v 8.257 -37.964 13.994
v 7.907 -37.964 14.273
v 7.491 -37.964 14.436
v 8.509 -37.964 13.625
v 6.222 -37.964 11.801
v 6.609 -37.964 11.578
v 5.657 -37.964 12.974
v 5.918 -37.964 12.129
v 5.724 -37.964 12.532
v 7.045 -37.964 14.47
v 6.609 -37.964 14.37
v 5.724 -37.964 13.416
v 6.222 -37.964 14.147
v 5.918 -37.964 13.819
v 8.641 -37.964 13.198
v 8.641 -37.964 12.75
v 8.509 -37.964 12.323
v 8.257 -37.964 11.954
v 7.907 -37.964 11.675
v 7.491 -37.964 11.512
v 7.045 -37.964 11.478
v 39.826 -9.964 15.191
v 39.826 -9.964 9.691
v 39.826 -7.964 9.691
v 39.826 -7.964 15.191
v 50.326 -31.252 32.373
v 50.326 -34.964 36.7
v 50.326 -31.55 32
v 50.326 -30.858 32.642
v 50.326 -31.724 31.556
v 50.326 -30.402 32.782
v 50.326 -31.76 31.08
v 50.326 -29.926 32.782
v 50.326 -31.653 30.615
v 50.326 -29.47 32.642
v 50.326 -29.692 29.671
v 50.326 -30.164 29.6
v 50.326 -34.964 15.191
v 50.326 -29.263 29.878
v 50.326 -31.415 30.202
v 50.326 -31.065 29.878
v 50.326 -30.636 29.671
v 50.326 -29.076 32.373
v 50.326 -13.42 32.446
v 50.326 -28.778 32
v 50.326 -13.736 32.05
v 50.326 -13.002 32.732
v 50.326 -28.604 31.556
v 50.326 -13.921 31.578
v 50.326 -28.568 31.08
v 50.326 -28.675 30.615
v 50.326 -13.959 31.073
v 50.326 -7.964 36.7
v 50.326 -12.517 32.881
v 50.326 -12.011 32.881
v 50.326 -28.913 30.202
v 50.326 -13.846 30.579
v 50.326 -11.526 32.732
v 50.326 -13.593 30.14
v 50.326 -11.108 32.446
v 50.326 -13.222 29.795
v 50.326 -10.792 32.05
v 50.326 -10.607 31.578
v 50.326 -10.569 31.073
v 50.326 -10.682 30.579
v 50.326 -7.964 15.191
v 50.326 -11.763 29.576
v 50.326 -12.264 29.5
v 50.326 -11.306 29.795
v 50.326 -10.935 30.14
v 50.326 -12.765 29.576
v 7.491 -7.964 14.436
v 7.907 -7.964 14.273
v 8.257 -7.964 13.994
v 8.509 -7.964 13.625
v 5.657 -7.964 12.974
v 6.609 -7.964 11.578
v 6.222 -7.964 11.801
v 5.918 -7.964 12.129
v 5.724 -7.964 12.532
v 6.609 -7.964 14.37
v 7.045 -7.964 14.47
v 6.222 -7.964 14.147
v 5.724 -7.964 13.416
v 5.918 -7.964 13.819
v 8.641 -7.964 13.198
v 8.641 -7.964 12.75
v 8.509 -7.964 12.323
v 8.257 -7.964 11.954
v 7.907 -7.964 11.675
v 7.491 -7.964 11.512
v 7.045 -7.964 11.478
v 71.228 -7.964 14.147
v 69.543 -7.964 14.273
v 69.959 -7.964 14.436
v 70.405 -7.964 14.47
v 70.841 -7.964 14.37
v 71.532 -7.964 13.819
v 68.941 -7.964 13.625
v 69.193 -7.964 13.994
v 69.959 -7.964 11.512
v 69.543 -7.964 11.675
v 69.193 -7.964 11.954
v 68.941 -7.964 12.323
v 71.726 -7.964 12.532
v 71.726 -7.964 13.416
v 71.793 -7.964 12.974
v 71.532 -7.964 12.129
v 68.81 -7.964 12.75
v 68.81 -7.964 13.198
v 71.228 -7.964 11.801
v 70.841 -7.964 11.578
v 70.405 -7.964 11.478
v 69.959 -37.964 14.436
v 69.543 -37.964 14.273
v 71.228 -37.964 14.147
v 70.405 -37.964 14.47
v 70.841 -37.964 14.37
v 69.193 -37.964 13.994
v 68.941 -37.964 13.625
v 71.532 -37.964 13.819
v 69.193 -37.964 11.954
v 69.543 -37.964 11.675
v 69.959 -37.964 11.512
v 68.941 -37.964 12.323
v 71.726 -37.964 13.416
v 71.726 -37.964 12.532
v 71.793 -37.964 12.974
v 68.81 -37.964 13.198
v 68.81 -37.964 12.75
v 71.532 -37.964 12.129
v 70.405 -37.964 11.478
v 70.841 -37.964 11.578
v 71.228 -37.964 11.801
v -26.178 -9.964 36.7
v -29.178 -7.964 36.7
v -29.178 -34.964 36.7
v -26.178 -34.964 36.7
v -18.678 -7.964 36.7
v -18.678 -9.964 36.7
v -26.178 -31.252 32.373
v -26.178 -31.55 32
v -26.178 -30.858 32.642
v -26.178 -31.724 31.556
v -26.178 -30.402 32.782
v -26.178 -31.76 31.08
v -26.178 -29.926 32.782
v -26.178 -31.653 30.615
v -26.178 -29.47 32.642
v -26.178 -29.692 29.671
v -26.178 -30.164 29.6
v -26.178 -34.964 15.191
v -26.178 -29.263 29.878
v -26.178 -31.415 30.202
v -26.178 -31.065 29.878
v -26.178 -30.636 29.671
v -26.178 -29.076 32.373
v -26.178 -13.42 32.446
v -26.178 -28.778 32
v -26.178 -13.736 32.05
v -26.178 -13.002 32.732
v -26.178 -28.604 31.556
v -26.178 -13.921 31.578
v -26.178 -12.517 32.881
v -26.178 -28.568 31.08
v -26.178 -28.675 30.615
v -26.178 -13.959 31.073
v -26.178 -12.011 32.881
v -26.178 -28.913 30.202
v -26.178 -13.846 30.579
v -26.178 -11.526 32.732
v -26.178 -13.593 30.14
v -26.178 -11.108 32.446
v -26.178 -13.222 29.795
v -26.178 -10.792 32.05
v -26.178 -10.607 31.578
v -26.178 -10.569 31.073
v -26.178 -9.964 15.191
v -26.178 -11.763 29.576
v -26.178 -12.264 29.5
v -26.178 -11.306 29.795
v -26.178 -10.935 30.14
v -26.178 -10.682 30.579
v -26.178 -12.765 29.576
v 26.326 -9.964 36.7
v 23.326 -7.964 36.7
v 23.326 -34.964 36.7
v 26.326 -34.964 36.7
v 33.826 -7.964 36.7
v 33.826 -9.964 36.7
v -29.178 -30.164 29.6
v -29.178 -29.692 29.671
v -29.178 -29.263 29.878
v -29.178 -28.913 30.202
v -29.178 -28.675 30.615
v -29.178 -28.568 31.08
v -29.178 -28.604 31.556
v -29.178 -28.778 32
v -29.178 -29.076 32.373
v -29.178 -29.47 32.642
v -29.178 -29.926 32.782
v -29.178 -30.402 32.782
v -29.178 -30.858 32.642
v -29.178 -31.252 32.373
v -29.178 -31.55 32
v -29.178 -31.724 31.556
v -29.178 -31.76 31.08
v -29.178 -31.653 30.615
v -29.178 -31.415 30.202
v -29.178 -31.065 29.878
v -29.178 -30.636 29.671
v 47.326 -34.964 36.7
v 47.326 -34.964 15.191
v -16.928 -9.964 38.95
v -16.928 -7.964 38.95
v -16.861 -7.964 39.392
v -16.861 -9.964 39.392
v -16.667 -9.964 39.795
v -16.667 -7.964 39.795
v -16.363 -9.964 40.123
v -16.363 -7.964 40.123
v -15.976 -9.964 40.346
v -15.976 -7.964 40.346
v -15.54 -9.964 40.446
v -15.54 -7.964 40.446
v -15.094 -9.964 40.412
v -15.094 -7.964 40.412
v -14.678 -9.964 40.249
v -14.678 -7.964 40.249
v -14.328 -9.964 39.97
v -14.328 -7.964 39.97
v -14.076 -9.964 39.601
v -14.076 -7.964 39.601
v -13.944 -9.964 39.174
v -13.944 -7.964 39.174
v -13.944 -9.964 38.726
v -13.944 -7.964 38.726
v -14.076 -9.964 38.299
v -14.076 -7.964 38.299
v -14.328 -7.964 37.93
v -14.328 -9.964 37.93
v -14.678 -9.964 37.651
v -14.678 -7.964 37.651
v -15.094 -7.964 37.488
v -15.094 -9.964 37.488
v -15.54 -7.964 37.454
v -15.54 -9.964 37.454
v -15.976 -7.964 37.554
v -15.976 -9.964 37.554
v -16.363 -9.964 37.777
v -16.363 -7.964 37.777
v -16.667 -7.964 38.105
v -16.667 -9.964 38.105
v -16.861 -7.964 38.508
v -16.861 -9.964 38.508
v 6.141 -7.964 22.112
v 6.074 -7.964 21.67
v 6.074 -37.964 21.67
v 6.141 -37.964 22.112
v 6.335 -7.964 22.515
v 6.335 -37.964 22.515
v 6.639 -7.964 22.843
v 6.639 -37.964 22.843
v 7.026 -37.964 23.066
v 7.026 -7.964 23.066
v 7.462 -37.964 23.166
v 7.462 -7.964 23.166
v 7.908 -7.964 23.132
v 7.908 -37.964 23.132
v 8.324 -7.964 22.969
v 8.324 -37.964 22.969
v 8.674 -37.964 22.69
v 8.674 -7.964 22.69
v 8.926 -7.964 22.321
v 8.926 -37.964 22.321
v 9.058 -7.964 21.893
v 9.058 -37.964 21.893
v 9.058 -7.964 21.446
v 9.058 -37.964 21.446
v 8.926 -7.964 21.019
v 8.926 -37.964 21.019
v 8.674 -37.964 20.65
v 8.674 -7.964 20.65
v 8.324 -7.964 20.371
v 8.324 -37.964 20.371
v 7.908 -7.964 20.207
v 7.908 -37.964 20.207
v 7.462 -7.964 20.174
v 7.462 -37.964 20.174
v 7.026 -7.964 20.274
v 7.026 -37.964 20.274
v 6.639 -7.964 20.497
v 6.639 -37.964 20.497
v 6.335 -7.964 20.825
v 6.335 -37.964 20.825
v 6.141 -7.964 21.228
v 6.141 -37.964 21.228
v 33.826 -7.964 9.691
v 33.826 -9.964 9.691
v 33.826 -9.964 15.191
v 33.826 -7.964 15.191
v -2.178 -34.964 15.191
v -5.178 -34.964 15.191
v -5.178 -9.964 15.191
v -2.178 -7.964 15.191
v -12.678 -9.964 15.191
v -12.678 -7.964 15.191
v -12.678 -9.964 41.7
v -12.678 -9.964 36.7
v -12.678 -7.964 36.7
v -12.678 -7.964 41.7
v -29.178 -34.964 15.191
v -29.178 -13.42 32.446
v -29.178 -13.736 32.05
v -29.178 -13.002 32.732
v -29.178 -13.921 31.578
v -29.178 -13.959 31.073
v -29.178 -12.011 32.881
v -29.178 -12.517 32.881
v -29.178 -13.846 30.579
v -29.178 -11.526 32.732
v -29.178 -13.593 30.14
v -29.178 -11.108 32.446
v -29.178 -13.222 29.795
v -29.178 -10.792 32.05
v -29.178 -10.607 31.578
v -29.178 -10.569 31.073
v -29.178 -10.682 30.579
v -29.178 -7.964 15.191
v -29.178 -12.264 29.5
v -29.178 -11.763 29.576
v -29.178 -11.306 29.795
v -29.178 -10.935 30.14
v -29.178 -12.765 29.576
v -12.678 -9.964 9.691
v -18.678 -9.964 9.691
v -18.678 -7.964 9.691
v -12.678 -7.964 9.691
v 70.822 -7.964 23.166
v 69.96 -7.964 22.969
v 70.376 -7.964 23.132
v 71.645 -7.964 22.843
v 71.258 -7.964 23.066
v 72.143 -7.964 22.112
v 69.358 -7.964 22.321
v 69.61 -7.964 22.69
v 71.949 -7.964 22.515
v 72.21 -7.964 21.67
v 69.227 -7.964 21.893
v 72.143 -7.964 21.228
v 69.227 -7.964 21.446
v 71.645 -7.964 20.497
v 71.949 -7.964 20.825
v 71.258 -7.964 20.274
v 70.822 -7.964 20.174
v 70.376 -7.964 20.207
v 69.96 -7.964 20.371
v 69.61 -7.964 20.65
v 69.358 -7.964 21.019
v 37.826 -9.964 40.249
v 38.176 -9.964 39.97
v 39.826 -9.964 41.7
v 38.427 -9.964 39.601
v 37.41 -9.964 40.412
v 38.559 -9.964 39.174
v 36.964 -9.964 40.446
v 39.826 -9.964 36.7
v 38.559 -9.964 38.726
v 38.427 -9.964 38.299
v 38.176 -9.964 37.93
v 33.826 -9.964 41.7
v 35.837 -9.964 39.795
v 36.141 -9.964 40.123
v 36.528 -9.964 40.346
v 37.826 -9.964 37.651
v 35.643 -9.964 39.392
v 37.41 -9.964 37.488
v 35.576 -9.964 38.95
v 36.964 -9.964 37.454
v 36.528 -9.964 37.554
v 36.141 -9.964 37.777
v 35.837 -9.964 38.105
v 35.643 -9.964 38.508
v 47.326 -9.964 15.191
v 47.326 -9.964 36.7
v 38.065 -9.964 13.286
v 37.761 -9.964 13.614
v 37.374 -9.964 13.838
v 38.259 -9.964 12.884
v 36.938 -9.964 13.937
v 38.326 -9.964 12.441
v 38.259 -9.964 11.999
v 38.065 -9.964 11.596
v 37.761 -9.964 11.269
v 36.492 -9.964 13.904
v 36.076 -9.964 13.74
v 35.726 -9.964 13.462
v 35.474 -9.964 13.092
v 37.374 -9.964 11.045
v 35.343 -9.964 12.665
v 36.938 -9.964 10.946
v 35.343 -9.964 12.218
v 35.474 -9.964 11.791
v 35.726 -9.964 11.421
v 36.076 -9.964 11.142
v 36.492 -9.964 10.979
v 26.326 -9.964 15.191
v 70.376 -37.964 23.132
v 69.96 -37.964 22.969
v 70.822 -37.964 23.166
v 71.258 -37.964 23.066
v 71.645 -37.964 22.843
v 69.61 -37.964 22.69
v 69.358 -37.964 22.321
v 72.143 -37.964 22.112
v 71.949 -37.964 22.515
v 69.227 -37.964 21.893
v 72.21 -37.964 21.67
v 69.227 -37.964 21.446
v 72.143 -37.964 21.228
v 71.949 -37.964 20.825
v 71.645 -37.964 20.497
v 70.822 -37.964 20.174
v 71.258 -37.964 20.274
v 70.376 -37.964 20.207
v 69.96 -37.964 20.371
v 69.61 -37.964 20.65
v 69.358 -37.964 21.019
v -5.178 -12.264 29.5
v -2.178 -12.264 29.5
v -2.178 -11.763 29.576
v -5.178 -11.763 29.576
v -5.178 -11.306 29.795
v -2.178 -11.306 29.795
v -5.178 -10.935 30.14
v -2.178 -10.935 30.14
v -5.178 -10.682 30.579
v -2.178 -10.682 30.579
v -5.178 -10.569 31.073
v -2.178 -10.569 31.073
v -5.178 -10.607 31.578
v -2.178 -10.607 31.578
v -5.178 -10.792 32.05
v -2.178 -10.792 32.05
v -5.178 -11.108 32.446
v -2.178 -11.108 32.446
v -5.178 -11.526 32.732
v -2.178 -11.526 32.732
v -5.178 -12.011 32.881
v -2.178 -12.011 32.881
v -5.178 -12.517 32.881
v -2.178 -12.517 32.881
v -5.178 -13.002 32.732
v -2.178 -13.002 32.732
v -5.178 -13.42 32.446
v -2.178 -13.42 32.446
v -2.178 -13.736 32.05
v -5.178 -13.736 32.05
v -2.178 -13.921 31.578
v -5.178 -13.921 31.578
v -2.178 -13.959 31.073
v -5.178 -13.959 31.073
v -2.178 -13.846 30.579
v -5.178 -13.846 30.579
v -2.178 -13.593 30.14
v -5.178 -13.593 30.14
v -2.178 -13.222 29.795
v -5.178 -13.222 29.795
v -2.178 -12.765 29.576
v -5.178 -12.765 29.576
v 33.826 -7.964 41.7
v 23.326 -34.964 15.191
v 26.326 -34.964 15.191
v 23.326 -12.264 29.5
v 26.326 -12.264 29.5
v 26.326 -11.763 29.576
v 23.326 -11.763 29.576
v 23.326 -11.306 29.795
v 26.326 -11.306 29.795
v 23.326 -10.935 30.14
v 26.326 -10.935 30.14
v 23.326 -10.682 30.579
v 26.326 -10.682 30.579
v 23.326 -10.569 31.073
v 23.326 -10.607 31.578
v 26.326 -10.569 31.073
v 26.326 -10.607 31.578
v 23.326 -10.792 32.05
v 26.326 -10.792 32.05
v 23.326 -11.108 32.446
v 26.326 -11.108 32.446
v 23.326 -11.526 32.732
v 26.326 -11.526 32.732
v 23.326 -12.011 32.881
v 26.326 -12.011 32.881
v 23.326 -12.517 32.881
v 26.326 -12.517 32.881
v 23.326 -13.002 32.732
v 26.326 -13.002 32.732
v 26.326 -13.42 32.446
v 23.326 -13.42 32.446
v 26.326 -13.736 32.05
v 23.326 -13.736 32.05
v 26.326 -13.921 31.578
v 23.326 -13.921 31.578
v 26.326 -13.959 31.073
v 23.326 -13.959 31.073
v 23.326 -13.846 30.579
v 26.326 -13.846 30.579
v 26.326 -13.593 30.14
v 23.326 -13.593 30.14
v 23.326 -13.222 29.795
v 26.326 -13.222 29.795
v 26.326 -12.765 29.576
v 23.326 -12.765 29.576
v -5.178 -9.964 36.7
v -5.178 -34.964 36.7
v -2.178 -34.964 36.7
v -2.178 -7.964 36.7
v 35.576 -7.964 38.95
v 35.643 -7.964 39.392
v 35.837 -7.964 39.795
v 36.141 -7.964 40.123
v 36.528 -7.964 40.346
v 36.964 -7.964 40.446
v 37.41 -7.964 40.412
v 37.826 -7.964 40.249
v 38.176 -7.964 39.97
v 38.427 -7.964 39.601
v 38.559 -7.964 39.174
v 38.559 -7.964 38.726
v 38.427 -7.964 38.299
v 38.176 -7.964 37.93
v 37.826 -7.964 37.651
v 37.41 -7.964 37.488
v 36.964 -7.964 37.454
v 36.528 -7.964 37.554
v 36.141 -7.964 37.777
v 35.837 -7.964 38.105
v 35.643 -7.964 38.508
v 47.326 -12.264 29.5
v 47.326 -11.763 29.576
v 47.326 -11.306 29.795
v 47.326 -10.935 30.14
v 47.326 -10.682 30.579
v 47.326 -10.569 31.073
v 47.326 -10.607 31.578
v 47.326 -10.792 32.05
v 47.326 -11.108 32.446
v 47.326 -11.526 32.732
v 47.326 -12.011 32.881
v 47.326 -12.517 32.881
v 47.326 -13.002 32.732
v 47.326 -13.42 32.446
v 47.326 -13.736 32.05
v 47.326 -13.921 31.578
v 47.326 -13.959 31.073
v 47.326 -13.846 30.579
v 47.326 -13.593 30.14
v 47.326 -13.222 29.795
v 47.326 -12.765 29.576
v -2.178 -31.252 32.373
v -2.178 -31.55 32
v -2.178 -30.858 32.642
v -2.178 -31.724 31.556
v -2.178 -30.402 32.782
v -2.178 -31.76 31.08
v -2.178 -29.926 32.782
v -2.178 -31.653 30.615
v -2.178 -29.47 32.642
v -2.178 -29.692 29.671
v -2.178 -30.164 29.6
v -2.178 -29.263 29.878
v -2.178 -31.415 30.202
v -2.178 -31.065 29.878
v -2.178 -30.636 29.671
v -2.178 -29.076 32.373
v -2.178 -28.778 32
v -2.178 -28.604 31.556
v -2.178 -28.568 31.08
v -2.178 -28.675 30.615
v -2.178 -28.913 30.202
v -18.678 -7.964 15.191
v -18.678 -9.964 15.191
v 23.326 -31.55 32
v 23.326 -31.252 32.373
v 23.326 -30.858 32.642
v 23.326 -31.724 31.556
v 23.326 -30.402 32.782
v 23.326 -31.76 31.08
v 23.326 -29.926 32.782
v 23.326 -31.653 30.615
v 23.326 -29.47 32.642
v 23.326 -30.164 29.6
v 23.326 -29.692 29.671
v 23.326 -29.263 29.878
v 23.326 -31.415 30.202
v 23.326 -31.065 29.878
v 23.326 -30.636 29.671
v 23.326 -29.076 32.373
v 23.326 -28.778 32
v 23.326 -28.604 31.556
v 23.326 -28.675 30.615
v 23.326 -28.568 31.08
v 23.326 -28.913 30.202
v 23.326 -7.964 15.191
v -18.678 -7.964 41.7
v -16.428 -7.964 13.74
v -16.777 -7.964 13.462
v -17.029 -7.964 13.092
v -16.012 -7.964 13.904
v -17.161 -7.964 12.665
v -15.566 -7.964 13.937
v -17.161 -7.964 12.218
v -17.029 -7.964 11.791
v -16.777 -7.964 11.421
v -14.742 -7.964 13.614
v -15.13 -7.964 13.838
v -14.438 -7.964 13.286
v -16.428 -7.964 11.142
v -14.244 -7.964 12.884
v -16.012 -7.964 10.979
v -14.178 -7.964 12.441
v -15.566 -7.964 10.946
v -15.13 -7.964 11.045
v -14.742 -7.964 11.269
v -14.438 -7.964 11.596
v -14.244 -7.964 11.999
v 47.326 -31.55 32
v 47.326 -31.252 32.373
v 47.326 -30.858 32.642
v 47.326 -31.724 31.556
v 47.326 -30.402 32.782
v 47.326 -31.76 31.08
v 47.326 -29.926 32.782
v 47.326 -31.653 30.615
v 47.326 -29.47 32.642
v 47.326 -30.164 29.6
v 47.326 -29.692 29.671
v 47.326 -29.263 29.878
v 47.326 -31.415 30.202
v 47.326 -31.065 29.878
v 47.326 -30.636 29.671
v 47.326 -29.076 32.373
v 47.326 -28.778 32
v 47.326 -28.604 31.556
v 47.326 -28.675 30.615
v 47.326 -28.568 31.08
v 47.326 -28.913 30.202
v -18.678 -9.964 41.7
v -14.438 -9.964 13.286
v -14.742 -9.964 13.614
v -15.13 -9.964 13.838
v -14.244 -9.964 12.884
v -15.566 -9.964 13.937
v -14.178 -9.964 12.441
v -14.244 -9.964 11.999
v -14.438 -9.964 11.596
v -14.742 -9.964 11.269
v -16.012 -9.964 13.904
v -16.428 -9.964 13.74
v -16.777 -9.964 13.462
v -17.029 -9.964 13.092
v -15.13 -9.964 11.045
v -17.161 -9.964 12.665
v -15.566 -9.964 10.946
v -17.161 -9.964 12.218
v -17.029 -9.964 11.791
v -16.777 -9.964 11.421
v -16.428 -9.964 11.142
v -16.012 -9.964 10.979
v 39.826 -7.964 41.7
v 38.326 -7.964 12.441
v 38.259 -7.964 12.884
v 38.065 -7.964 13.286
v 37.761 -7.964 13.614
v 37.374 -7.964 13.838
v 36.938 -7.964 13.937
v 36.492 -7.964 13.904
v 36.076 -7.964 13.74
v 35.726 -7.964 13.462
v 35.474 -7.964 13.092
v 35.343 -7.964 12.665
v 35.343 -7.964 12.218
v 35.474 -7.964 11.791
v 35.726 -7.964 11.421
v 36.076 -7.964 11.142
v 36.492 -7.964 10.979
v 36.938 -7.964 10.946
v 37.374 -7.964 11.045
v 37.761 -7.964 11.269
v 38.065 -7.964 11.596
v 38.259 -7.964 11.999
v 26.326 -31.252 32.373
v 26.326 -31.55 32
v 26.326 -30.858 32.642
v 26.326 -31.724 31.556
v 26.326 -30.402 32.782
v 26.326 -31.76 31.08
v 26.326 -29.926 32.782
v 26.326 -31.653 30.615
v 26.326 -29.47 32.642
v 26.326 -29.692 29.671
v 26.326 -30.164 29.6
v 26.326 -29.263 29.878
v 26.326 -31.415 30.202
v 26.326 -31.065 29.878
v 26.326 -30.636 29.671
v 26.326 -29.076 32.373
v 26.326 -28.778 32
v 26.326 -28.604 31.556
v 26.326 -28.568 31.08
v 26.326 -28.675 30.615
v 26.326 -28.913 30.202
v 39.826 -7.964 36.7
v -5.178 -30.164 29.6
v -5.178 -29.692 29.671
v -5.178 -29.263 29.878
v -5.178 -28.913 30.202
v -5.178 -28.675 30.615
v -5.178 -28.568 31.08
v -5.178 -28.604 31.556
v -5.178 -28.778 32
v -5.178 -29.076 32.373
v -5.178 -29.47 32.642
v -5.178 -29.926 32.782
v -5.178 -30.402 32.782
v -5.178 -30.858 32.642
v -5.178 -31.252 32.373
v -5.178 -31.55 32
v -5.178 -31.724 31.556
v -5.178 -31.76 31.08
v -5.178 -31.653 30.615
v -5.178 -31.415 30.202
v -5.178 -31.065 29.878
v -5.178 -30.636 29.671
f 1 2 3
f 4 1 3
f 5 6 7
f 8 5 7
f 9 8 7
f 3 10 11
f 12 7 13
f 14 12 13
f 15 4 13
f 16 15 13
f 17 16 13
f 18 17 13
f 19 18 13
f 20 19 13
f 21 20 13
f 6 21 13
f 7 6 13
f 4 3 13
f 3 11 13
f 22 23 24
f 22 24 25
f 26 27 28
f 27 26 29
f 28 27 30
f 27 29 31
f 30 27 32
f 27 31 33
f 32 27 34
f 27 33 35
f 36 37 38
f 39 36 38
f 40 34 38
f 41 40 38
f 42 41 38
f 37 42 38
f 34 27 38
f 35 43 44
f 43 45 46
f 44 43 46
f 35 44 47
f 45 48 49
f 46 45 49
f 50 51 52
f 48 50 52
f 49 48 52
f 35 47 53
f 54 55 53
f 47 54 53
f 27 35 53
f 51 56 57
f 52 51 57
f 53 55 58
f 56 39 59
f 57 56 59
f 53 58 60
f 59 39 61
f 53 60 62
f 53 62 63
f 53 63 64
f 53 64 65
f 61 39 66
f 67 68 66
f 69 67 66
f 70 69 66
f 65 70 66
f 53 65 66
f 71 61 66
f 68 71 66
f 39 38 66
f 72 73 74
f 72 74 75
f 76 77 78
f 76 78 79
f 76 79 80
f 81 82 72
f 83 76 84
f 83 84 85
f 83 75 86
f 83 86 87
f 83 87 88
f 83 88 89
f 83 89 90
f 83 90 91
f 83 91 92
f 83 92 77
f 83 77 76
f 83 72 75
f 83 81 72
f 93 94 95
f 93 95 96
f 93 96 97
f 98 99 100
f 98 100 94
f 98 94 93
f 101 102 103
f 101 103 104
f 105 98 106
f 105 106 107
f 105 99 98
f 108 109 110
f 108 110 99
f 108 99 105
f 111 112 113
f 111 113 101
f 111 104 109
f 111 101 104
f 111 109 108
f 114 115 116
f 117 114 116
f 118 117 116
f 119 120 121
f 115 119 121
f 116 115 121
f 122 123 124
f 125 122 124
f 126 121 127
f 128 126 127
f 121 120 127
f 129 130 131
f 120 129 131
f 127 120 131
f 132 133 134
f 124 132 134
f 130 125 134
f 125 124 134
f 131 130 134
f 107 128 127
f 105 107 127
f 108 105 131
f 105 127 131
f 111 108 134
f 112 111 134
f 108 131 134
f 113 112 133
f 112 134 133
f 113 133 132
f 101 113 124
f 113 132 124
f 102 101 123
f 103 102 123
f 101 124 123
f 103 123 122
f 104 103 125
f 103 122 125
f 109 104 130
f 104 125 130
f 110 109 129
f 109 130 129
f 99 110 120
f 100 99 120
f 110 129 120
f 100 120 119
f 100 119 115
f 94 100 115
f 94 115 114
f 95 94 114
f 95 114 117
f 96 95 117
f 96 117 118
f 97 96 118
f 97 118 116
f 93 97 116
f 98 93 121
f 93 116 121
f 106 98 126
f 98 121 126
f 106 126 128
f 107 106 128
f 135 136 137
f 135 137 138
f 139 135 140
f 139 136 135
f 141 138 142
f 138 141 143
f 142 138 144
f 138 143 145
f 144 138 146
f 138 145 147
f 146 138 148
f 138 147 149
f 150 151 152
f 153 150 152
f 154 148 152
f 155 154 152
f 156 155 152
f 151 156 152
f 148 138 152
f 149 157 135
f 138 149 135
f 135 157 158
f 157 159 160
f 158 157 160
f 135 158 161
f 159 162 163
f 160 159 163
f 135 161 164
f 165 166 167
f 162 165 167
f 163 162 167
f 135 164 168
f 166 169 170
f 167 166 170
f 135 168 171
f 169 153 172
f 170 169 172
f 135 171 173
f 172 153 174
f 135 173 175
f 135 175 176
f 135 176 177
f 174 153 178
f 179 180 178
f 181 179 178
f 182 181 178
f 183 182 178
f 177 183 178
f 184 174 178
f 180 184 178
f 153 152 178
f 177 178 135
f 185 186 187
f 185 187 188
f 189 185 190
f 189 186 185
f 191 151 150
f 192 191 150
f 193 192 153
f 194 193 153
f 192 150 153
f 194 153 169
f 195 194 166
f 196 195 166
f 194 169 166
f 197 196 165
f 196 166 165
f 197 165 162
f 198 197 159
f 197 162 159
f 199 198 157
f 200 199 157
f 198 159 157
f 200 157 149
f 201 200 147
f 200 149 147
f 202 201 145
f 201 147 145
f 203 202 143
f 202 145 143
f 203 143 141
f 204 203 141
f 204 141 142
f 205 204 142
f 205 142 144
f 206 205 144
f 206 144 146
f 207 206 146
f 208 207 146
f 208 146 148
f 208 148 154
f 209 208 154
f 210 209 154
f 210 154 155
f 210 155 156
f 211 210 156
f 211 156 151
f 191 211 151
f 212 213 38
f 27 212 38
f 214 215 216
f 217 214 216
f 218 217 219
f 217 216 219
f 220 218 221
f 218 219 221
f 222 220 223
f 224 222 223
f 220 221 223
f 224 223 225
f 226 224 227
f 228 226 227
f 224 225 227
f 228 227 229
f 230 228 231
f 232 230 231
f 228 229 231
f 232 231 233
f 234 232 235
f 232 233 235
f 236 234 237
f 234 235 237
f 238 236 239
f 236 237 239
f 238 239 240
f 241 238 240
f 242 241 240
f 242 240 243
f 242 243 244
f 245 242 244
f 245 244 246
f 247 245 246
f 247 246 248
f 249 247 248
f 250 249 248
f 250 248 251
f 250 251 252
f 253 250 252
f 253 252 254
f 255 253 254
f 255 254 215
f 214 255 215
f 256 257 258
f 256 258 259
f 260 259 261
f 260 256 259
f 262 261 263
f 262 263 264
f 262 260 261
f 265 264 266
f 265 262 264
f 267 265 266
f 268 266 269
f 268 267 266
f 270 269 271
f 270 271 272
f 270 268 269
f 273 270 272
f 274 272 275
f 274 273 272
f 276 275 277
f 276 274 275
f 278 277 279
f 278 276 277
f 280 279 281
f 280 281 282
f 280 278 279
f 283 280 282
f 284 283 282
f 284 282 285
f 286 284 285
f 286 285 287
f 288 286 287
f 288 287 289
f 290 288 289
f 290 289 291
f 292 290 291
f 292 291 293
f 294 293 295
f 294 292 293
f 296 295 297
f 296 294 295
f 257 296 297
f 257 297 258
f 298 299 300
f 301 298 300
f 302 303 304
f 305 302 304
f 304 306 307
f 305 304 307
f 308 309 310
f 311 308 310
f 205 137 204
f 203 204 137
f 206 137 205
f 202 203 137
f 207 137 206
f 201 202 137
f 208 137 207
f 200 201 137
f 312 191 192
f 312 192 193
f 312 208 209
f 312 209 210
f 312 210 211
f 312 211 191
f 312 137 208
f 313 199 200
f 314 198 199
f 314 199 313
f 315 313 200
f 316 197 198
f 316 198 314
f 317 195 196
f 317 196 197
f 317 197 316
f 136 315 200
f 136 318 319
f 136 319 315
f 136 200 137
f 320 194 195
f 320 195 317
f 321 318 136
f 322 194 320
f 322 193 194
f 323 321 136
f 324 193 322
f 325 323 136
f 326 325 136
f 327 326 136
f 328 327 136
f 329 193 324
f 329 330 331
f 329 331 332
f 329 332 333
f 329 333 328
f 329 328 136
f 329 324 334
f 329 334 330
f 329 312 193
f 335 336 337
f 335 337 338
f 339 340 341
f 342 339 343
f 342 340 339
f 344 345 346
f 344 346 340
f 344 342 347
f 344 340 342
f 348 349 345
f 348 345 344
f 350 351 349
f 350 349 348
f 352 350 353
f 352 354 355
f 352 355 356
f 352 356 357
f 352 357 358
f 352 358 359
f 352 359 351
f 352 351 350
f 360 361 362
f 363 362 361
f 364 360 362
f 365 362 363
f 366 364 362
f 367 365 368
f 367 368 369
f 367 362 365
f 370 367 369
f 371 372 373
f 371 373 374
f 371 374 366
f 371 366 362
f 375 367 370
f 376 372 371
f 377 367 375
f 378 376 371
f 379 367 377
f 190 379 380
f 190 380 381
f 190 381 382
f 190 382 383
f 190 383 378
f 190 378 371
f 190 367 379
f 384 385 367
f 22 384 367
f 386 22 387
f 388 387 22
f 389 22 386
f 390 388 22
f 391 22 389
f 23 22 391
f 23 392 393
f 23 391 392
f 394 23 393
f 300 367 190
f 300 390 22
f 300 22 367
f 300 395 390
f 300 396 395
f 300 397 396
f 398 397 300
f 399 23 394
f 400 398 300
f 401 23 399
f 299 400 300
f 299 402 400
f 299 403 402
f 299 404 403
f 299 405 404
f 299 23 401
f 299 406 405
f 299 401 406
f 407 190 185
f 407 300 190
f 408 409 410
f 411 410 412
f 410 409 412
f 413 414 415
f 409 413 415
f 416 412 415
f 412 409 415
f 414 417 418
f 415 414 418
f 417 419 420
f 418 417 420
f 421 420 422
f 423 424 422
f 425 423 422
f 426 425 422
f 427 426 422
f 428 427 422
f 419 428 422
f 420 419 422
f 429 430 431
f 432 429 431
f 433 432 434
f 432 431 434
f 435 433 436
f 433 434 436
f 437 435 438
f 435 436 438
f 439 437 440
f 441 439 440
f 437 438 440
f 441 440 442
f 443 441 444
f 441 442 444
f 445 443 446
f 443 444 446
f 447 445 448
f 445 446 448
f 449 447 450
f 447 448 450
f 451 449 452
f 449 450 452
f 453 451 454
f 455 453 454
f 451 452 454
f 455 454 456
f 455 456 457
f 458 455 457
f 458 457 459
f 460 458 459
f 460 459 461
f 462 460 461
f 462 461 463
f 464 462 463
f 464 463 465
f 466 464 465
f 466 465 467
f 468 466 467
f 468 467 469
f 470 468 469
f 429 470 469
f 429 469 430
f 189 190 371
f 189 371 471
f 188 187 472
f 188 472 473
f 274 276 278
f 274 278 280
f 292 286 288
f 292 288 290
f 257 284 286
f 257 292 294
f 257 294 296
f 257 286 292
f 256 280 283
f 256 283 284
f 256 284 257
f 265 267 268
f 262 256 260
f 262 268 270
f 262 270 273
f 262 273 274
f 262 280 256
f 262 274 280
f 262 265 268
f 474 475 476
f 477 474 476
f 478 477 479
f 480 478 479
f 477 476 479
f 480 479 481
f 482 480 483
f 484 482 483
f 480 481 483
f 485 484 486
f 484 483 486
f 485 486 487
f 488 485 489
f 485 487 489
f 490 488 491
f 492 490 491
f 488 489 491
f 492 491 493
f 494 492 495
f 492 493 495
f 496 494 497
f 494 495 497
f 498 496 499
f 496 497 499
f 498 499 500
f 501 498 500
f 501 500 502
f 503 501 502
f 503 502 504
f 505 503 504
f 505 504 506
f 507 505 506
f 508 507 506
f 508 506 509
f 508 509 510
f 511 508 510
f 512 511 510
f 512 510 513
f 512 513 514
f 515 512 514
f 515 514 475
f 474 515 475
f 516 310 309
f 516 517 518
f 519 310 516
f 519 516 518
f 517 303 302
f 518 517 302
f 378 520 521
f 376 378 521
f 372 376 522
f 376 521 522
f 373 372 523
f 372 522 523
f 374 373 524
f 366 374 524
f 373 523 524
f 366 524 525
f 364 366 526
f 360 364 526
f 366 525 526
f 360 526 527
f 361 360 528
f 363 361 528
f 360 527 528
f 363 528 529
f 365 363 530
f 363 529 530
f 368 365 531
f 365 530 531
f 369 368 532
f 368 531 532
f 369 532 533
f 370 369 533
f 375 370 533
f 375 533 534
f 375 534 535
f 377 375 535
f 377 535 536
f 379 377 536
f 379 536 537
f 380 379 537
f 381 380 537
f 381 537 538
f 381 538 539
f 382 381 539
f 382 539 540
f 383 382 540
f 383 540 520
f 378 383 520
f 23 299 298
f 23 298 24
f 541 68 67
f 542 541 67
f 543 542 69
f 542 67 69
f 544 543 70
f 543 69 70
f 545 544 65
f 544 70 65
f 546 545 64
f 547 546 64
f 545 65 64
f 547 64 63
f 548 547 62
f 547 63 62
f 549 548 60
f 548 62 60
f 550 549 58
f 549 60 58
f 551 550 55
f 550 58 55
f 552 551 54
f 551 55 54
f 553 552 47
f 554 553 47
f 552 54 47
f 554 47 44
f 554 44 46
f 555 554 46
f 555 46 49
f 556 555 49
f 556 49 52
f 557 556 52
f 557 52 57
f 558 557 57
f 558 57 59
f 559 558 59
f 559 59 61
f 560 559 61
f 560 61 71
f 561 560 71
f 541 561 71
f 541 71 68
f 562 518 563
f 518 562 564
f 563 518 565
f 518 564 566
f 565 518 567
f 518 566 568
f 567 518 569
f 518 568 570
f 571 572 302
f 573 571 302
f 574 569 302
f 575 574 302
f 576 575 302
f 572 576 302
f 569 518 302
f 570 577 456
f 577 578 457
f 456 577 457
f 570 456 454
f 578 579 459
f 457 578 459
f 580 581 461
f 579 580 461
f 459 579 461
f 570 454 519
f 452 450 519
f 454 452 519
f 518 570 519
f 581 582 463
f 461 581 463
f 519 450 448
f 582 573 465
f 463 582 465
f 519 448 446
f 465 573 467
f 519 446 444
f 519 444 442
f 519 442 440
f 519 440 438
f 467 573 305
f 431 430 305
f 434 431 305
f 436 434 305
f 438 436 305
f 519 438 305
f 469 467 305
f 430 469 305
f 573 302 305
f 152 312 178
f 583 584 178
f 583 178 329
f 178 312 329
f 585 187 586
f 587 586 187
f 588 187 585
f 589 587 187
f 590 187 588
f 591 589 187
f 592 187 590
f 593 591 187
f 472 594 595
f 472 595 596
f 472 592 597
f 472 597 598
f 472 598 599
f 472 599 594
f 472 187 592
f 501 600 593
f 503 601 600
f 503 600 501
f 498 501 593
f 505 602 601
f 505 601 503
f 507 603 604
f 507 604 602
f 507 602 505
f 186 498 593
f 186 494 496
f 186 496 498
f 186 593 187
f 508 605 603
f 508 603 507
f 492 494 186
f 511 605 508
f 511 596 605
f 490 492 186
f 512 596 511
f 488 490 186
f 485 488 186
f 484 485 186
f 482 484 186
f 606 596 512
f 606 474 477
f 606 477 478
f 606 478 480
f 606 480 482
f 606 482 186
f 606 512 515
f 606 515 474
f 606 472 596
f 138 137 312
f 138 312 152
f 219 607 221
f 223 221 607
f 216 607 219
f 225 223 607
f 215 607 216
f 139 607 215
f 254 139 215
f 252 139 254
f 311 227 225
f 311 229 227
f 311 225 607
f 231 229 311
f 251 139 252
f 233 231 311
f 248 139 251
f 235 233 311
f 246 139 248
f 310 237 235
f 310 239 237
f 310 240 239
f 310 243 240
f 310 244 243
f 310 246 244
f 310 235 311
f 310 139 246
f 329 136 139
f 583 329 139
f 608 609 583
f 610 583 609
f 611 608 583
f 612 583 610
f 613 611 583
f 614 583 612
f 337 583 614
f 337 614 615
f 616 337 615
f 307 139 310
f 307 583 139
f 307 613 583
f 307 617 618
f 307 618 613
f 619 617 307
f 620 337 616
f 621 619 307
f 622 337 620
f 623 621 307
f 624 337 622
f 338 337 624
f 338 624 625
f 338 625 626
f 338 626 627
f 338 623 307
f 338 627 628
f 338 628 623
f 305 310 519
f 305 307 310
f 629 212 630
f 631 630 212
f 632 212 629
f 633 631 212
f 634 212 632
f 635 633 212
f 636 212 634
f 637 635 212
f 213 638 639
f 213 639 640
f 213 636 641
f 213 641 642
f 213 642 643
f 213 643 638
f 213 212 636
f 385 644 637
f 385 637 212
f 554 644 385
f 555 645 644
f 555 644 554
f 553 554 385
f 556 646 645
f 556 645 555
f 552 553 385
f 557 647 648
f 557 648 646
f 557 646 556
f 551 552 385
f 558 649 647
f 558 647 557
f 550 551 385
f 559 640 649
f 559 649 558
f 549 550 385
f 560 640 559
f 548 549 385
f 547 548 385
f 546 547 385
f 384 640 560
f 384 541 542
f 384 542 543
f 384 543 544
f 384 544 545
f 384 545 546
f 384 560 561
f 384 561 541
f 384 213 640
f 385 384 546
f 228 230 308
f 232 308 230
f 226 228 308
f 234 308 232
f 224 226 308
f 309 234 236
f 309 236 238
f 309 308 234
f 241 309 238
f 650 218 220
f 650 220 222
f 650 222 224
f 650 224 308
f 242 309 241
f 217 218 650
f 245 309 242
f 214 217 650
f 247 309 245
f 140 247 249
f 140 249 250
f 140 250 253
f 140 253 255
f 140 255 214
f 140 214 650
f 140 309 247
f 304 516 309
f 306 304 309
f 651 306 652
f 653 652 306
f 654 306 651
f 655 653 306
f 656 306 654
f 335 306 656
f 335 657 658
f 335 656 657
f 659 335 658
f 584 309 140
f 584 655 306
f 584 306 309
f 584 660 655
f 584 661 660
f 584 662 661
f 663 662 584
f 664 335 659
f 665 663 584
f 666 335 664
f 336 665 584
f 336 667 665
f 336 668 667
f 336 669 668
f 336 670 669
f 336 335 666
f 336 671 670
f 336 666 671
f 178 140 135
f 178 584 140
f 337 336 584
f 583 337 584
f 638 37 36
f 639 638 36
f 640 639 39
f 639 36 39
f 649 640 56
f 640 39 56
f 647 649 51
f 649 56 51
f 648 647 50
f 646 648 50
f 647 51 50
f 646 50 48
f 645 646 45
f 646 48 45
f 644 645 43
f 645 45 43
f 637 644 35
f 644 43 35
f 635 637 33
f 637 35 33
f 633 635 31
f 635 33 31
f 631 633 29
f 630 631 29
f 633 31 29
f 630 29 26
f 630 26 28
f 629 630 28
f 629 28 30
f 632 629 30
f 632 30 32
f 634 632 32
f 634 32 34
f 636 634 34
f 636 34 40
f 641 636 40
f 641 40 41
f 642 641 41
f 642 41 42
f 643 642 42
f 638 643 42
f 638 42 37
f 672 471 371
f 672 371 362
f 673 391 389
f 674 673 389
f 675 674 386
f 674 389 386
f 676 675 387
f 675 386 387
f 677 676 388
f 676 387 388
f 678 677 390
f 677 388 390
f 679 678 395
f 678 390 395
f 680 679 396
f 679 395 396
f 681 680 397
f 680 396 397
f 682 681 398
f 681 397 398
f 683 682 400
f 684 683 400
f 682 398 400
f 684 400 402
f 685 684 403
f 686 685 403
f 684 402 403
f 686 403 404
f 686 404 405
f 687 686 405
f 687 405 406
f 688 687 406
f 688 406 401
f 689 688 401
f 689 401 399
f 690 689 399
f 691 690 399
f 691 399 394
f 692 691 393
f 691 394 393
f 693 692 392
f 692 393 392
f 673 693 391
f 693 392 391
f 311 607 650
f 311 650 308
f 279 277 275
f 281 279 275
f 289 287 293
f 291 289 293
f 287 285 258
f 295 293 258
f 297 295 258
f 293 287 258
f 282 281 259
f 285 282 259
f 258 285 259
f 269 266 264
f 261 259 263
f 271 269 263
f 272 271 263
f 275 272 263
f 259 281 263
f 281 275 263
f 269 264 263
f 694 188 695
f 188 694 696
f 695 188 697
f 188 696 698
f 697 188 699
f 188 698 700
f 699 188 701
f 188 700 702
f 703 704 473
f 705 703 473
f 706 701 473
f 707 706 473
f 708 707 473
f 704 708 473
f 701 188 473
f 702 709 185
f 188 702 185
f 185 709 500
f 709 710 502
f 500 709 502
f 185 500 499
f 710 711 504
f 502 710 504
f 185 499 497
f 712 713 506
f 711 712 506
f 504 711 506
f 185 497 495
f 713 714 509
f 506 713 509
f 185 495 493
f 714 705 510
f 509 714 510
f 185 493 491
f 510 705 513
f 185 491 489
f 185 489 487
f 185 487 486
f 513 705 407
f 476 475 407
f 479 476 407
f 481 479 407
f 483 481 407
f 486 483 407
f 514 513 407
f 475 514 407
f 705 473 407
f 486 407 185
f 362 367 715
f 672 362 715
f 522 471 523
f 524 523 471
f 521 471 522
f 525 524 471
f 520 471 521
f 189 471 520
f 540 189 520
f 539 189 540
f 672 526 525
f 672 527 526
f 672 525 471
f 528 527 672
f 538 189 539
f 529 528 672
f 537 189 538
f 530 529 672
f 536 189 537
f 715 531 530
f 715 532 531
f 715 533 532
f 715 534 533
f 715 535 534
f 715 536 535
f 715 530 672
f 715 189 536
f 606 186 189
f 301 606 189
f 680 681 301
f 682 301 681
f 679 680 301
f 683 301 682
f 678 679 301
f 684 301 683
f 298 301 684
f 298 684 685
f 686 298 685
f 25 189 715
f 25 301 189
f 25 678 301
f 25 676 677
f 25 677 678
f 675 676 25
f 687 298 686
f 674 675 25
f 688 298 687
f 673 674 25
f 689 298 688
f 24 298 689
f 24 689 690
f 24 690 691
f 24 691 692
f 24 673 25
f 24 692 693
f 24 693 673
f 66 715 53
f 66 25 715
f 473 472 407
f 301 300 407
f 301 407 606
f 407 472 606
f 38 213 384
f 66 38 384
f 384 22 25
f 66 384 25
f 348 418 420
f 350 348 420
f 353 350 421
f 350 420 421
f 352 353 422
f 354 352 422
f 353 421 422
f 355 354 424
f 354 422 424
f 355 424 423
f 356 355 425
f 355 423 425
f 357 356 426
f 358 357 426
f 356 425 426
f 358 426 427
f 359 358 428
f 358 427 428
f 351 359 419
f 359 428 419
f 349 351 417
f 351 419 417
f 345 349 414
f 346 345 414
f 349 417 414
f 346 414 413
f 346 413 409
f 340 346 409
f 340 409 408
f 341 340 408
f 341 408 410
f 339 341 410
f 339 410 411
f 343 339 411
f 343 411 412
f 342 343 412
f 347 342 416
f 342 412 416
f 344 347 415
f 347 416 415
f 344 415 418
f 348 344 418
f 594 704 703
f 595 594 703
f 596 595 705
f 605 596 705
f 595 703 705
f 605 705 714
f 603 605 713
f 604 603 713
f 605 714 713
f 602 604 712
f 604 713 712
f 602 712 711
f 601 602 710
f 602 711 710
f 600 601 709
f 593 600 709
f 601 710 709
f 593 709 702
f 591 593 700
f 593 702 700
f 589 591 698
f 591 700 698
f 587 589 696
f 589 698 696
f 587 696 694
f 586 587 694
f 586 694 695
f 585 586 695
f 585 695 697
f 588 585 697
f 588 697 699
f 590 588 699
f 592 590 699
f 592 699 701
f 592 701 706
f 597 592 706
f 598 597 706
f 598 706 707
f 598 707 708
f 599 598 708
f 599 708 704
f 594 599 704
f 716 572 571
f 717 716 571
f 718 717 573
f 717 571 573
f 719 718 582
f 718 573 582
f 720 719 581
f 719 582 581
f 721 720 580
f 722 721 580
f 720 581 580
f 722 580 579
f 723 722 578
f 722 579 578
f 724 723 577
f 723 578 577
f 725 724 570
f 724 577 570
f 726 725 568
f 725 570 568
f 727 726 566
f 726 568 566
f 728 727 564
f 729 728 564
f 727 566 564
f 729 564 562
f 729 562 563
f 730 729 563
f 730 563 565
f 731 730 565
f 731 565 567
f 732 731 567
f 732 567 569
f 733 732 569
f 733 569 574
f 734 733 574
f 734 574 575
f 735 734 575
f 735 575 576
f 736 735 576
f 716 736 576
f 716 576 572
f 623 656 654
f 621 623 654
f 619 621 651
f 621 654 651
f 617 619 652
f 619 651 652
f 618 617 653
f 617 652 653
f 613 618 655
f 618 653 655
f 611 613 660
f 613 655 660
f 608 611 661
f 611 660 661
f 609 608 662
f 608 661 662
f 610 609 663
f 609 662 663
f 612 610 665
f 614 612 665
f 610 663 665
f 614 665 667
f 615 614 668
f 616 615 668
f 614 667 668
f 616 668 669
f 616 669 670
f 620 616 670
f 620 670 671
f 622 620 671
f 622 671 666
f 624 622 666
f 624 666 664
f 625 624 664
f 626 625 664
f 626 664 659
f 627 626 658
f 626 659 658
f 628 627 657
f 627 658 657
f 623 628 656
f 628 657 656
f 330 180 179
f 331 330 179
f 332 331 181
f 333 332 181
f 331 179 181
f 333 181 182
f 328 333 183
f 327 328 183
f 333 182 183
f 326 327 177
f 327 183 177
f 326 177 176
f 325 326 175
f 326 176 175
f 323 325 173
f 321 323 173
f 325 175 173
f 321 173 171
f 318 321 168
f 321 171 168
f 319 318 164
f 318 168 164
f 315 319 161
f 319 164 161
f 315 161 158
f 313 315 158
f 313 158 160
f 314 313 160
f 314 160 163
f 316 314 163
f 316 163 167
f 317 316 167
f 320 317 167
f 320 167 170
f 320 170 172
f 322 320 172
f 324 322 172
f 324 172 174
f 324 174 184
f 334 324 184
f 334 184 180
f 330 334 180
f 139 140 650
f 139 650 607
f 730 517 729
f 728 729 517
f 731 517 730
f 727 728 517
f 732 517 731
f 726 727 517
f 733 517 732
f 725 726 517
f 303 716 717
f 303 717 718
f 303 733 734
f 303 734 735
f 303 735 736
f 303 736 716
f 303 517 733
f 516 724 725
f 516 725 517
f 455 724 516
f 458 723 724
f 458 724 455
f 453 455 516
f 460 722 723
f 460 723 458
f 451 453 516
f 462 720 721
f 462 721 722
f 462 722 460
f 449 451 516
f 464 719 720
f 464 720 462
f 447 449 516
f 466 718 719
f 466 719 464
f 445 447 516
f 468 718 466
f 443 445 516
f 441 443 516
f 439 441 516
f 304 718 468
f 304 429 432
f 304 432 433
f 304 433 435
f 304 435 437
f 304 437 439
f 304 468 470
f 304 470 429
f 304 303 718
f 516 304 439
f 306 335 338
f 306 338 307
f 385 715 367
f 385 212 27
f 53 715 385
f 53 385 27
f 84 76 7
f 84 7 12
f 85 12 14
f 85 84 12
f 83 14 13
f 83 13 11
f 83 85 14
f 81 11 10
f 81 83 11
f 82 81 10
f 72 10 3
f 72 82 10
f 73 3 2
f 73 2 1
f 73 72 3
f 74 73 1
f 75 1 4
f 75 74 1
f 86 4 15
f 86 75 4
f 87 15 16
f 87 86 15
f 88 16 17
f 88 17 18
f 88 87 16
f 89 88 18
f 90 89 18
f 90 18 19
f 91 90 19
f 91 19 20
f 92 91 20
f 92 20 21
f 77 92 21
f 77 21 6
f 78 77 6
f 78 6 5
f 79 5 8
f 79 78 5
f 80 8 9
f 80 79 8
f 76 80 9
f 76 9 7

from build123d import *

# Parameters (mm, degrees)
SKETCH1_W                 = 27
SKETCH1_H                 = 27
BOSS_EXTRUDE1_DEPTH       = 36.7
SKETCH2_W                 = 21
SKETCH2_H                 = 25
CUT_EXTRUDE1_DEPTH        = 36.7
SKETCH3_R                 = 1.7
SKETCH3_R_2               = 1.6
CUT_EXTRUDE2_DEPTH        = 36.7
SKETCH4_R                 = 3
CUT_EXTRUDE3_DEPTH        = 36.7
SKETCH8_R                 = 1.5
BOSS_EXTRUDE3_DEPTH       = 30
BOSS_EXTRUDE3_2_DEPTH     = 30
SKETCH9_W                 = 5.918746276
SKETCH9_H                 = 6
SKETCH9_W_2               = 6.707912446
CUT_EXTRUDE4_DEPTH        = 12
SKETCH11_W                = 15.191448775
SKETCH11_H                = 37.067540439
CUT_EXTRUDE6_DEPTH        = 32
SKETCH15_W                = 6
SKETCH15_H                = 12.008551225
SKETCH15_R                = 1.5
BOSS_EXTRUDE5_DEPTH       = 2.5
SKETCH17_W                = 99.088440485
SKETCH17_H                = 65.829588933
CUT_EXTRUDE9_DEPTH        = 50
SKETCH18_W                = 6
SKETCH18_H                = 2
BOSS_EXTRUDE6_DEPTH       = 5
SKETCH19_R                = 1.5
CUT_EXTRUDE10_DEPTH       = 5
SKETCH20_W                = 6
SKETCH20_H                = 5.5
SKETCH20_R                = 1.5
BOSS_EXTRUDE7_DEPTH       = 2
BODY_MOVE_COPY8_START     = -37.96401366
BODY_MOVE_COPY8_OUTLINE_R = 1.5
BODY_MOVE_COPY8_DEPTH     = 30


# Read off the part's stored shape, not the designer's step: Body-Move/Copy8
with BuildPart() as part:
    # Sketch1 → Boss-Extrude1 (new body)
    with BuildSketch(Plane.XY):
        with Locations((-15.677732696, -21.46401366)):
            Rectangle(SKETCH1_W, SKETCH1_H)
    extrude(amount=BOSS_EXTRUDE1_DEPTH)

    # Sketch2 → Cut-Extrude1 (cut)
    with BuildSketch(Plane(origin=(0, 0, 0), x_dir=(-1, 0, 0), z_dir=(0, 0, -1))):
        with Locations((15.677732696, -22.46401366)):
            Rectangle(SKETCH2_W, SKETCH2_H)
    extrude(amount=-CUT_EXTRUDE1_DEPTH, mode=Mode.SUBTRACT)

    # Sketch3 → Cut-Extrude2 (cut)
    with BuildSketch(Plane(origin=(-2.177732696, 0, 0), x_dir=(0, 0, -1), z_dir=(1, 0, 0))):
        with Locations((-31.2, -12.26401366)):
            Circle(SKETCH3_R)
        with Locations((-31.2, -30.16401366)):
            Circle(SKETCH3_R_2)
    extrude(amount=-CUT_EXTRUDE2_DEPTH, mode=Mode.SUBTRACT)

    # Sketch4 → Cut-Extrude3 (cut)
    with BuildSketch(Plane(origin=(-2.177732696, 0, 0), x_dir=(0, 0, -1), z_dir=(1, 0, 0))):
        with Locations((-12.025092395, -21.16401366)):
            Circle(SKETCH4_R)
    extrude(amount=-CUT_EXTRUDE3_DEPTH, mode=Mode.SUBTRACT)

    # Sketch9 → Cut-Extrude4 (cut)
    with BuildSketch(Plane(origin=(0, 0, 0), x_dir=(-1, 0, 0), z_dir=(0, 0, -1))):
        with Locations((3.689038825, -21.16401366)):
            Rectangle(SKETCH9_W, SKETCH9_H)
        with Locations((28.103867214, -21.16401366)):
            Rectangle(SKETCH9_W_2, SKETCH9_H)
    extrude(amount=-CUT_EXTRUDE4_DEPTH, mode=Mode.SUBTRACT)

    # Sketch11 → Cut-Extrude6 (cut)
    with BuildSketch(Plane.ZY.offset(29.177732696)):
        with Locations((7.595724388, -16.43024344)):
            Rectangle(SKETCH11_W, SKETCH11_H)
    extrude(amount=-CUT_EXTRUDE6_DEPTH, mode=Mode.SUBTRACT)


with BuildPart() as body_2:
    # Sketch8 → Boss-Extrude3 (new body)
    with BuildSketch(Plane(origin=(0, -7.96401366, 0), x_dir=(1, 0, 0), z_dir=(0, 1, 0))):
        with Locations(Location((7.15742756, -12.973989901, 0), (0, 0, 180))):
            Circle(SKETCH8_R)
    extrude(amount=-BOSS_EXTRUDE3_DEPTH)


with BuildPart() as body_3:
    # Sketch8 → Boss-Extrude3 2 (new body)
    with BuildSketch(Plane(origin=(0, -7.96401366, 0), x_dir=(1, 0, 0), z_dir=(0, 1, 0))):
        with Locations(Location((7.574350551, -21.669812293, 0), (0, 0, 180))):
            Circle(SKETCH8_R)
    extrude(amount=-BOSS_EXTRUDE3_2_DEPTH)


with BuildPart() as body_4:
    # Body-Move/Copy4: copy of part
    add(part.part.moved(Location((-70.821628829, 0, 0))))

    # Sketch15 → Boss-Extrude5 (add)
    with BuildSketch(Plane(origin=(0, -7.96401366, 0), x_dir=(1, 0, 0), z_dir=(0, 1, 0))):
        with Locations((-69.999361524, -25.945724388)):
            Rectangle(SKETCH15_W, SKETCH15_H)
        with Locations(Location((-69.999361524, -22.941448775, 0), (0, 0, 180))):
            Circle(SKETCH15_R, mode=Mode.SUBTRACT)
        with Locations(Location((-69.999361524, -28.95, 0), (0, 0, 180))):
            Circle(SKETCH15_R, mode=Mode.SUBTRACT)
    extrude(amount=-BOSS_EXTRUDE5_DEPTH)


with BuildPart() as body_5:
    # Body-Move/Copy5: copy of body 2
    add(body_2.part.moved(Location((-69.754488263, 0, 0))))


with BuildPart() as body_6:
    # Body-Move/Copy6: copy of body 3
    add(body_3.part.moved(Location((-71.521118541, 0, 0))))


with BuildPart() as cut_extrude9_tool:
    # Sketch17 → Cut-Extrude9 (new body)
    with BuildSketch(Plane(origin=(0, -7.96401366, 0), x_dir=(1, 0, 0), z_dir=(0, 1, 0))):
        with Locations((-104.540526015, -10.422992559)):
            Rectangle(SKETCH17_W, SKETCH17_H)
    extrude(amount=-CUT_EXTRUDE9_DEPTH)


with BuildPart() as body_4_1:
    add(body_4.part)

    # Cut-Extrude9: cut by cut_extrude9_tool
    add(cut_extrude9_tool.part, mode=Mode.SUBTRACT)


with BuildPart() as body_5_1:
    add(body_5.part)

    # Cut-Extrude9: cut by cut_extrude9_tool
    add(cut_extrude9_tool.part, mode=Mode.SUBTRACT)


with BuildPart() as body_6_1:
    add(body_6.part)

    # Cut-Extrude9: cut by cut_extrude9_tool
    add(cut_extrude9_tool.part, mode=Mode.SUBTRACT)


with BuildPart() as part_1:
    add(part.part)

    # Sketch18 → Boss-Extrude6 (add)
    with BuildSketch(Plane.XY.offset(36.7)):
        with Locations((-15.677732696, -8.96401366)):
            Rectangle(SKETCH18_W, SKETCH18_H)
    extrude(amount=BOSS_EXTRUDE6_DEPTH)

    # Sketch19 → Cut-Extrude10 (cut)
    with BuildSketch(Plane(origin=(0, -7.96401366, 0), x_dir=(1, 0, 0), z_dir=(0, 1, 0))):
        with Locations(Location((-15.427732696, -38.95, 0), (0, 0, 180))):
            Circle(SKETCH19_R)
    extrude(amount=-CUT_EXTRUDE10_DEPTH, mode=Mode.SUBTRACT)

    # Sketch20 → Boss-Extrude7 (add)
    with BuildSketch(Plane.XZ.offset(9.96401366)):
        with Locations((-15.677732696, 12.441448775)):
            Rectangle(SKETCH20_W, SKETCH20_H)
        with Locations((-15.677732696, 12.441448775)):
            Circle(SKETCH20_R, mode=Mode.SUBTRACT)
    extrude(amount=-BOSS_EXTRUDE7_DEPTH)


with BuildPart() as body_4_2:
    # Body-Move/Copy7: copy of part
    add(part_1.part.moved(Location((52.503676829, 0, 0))))


with BuildPart() as body_5_2:
    # Body-Move/Copy8 outline → Body-Move/Copy8 (new body)
    with BuildSketch(Plane(origin=(0, 0, 0), x_dir=(1, 0, 0), z_dir=(0, 1, 0)).offset(BODY_MOVE_COPY8_START)):
        with Locations((70.709770924, -21.669812293)):
            Circle(BODY_MOVE_COPY8_OUTLINE_R)
        with Locations((70.292847932, -12.973989901)):
            Circle(BODY_MOVE_COPY8_OUTLINE_R)
    extrude(amount=BODY_MOVE_COPY8_DEPTH)


solid = Compound([body_2.part, body_3.part, part_1.part, body_4_2.part, body_5_2.part])
